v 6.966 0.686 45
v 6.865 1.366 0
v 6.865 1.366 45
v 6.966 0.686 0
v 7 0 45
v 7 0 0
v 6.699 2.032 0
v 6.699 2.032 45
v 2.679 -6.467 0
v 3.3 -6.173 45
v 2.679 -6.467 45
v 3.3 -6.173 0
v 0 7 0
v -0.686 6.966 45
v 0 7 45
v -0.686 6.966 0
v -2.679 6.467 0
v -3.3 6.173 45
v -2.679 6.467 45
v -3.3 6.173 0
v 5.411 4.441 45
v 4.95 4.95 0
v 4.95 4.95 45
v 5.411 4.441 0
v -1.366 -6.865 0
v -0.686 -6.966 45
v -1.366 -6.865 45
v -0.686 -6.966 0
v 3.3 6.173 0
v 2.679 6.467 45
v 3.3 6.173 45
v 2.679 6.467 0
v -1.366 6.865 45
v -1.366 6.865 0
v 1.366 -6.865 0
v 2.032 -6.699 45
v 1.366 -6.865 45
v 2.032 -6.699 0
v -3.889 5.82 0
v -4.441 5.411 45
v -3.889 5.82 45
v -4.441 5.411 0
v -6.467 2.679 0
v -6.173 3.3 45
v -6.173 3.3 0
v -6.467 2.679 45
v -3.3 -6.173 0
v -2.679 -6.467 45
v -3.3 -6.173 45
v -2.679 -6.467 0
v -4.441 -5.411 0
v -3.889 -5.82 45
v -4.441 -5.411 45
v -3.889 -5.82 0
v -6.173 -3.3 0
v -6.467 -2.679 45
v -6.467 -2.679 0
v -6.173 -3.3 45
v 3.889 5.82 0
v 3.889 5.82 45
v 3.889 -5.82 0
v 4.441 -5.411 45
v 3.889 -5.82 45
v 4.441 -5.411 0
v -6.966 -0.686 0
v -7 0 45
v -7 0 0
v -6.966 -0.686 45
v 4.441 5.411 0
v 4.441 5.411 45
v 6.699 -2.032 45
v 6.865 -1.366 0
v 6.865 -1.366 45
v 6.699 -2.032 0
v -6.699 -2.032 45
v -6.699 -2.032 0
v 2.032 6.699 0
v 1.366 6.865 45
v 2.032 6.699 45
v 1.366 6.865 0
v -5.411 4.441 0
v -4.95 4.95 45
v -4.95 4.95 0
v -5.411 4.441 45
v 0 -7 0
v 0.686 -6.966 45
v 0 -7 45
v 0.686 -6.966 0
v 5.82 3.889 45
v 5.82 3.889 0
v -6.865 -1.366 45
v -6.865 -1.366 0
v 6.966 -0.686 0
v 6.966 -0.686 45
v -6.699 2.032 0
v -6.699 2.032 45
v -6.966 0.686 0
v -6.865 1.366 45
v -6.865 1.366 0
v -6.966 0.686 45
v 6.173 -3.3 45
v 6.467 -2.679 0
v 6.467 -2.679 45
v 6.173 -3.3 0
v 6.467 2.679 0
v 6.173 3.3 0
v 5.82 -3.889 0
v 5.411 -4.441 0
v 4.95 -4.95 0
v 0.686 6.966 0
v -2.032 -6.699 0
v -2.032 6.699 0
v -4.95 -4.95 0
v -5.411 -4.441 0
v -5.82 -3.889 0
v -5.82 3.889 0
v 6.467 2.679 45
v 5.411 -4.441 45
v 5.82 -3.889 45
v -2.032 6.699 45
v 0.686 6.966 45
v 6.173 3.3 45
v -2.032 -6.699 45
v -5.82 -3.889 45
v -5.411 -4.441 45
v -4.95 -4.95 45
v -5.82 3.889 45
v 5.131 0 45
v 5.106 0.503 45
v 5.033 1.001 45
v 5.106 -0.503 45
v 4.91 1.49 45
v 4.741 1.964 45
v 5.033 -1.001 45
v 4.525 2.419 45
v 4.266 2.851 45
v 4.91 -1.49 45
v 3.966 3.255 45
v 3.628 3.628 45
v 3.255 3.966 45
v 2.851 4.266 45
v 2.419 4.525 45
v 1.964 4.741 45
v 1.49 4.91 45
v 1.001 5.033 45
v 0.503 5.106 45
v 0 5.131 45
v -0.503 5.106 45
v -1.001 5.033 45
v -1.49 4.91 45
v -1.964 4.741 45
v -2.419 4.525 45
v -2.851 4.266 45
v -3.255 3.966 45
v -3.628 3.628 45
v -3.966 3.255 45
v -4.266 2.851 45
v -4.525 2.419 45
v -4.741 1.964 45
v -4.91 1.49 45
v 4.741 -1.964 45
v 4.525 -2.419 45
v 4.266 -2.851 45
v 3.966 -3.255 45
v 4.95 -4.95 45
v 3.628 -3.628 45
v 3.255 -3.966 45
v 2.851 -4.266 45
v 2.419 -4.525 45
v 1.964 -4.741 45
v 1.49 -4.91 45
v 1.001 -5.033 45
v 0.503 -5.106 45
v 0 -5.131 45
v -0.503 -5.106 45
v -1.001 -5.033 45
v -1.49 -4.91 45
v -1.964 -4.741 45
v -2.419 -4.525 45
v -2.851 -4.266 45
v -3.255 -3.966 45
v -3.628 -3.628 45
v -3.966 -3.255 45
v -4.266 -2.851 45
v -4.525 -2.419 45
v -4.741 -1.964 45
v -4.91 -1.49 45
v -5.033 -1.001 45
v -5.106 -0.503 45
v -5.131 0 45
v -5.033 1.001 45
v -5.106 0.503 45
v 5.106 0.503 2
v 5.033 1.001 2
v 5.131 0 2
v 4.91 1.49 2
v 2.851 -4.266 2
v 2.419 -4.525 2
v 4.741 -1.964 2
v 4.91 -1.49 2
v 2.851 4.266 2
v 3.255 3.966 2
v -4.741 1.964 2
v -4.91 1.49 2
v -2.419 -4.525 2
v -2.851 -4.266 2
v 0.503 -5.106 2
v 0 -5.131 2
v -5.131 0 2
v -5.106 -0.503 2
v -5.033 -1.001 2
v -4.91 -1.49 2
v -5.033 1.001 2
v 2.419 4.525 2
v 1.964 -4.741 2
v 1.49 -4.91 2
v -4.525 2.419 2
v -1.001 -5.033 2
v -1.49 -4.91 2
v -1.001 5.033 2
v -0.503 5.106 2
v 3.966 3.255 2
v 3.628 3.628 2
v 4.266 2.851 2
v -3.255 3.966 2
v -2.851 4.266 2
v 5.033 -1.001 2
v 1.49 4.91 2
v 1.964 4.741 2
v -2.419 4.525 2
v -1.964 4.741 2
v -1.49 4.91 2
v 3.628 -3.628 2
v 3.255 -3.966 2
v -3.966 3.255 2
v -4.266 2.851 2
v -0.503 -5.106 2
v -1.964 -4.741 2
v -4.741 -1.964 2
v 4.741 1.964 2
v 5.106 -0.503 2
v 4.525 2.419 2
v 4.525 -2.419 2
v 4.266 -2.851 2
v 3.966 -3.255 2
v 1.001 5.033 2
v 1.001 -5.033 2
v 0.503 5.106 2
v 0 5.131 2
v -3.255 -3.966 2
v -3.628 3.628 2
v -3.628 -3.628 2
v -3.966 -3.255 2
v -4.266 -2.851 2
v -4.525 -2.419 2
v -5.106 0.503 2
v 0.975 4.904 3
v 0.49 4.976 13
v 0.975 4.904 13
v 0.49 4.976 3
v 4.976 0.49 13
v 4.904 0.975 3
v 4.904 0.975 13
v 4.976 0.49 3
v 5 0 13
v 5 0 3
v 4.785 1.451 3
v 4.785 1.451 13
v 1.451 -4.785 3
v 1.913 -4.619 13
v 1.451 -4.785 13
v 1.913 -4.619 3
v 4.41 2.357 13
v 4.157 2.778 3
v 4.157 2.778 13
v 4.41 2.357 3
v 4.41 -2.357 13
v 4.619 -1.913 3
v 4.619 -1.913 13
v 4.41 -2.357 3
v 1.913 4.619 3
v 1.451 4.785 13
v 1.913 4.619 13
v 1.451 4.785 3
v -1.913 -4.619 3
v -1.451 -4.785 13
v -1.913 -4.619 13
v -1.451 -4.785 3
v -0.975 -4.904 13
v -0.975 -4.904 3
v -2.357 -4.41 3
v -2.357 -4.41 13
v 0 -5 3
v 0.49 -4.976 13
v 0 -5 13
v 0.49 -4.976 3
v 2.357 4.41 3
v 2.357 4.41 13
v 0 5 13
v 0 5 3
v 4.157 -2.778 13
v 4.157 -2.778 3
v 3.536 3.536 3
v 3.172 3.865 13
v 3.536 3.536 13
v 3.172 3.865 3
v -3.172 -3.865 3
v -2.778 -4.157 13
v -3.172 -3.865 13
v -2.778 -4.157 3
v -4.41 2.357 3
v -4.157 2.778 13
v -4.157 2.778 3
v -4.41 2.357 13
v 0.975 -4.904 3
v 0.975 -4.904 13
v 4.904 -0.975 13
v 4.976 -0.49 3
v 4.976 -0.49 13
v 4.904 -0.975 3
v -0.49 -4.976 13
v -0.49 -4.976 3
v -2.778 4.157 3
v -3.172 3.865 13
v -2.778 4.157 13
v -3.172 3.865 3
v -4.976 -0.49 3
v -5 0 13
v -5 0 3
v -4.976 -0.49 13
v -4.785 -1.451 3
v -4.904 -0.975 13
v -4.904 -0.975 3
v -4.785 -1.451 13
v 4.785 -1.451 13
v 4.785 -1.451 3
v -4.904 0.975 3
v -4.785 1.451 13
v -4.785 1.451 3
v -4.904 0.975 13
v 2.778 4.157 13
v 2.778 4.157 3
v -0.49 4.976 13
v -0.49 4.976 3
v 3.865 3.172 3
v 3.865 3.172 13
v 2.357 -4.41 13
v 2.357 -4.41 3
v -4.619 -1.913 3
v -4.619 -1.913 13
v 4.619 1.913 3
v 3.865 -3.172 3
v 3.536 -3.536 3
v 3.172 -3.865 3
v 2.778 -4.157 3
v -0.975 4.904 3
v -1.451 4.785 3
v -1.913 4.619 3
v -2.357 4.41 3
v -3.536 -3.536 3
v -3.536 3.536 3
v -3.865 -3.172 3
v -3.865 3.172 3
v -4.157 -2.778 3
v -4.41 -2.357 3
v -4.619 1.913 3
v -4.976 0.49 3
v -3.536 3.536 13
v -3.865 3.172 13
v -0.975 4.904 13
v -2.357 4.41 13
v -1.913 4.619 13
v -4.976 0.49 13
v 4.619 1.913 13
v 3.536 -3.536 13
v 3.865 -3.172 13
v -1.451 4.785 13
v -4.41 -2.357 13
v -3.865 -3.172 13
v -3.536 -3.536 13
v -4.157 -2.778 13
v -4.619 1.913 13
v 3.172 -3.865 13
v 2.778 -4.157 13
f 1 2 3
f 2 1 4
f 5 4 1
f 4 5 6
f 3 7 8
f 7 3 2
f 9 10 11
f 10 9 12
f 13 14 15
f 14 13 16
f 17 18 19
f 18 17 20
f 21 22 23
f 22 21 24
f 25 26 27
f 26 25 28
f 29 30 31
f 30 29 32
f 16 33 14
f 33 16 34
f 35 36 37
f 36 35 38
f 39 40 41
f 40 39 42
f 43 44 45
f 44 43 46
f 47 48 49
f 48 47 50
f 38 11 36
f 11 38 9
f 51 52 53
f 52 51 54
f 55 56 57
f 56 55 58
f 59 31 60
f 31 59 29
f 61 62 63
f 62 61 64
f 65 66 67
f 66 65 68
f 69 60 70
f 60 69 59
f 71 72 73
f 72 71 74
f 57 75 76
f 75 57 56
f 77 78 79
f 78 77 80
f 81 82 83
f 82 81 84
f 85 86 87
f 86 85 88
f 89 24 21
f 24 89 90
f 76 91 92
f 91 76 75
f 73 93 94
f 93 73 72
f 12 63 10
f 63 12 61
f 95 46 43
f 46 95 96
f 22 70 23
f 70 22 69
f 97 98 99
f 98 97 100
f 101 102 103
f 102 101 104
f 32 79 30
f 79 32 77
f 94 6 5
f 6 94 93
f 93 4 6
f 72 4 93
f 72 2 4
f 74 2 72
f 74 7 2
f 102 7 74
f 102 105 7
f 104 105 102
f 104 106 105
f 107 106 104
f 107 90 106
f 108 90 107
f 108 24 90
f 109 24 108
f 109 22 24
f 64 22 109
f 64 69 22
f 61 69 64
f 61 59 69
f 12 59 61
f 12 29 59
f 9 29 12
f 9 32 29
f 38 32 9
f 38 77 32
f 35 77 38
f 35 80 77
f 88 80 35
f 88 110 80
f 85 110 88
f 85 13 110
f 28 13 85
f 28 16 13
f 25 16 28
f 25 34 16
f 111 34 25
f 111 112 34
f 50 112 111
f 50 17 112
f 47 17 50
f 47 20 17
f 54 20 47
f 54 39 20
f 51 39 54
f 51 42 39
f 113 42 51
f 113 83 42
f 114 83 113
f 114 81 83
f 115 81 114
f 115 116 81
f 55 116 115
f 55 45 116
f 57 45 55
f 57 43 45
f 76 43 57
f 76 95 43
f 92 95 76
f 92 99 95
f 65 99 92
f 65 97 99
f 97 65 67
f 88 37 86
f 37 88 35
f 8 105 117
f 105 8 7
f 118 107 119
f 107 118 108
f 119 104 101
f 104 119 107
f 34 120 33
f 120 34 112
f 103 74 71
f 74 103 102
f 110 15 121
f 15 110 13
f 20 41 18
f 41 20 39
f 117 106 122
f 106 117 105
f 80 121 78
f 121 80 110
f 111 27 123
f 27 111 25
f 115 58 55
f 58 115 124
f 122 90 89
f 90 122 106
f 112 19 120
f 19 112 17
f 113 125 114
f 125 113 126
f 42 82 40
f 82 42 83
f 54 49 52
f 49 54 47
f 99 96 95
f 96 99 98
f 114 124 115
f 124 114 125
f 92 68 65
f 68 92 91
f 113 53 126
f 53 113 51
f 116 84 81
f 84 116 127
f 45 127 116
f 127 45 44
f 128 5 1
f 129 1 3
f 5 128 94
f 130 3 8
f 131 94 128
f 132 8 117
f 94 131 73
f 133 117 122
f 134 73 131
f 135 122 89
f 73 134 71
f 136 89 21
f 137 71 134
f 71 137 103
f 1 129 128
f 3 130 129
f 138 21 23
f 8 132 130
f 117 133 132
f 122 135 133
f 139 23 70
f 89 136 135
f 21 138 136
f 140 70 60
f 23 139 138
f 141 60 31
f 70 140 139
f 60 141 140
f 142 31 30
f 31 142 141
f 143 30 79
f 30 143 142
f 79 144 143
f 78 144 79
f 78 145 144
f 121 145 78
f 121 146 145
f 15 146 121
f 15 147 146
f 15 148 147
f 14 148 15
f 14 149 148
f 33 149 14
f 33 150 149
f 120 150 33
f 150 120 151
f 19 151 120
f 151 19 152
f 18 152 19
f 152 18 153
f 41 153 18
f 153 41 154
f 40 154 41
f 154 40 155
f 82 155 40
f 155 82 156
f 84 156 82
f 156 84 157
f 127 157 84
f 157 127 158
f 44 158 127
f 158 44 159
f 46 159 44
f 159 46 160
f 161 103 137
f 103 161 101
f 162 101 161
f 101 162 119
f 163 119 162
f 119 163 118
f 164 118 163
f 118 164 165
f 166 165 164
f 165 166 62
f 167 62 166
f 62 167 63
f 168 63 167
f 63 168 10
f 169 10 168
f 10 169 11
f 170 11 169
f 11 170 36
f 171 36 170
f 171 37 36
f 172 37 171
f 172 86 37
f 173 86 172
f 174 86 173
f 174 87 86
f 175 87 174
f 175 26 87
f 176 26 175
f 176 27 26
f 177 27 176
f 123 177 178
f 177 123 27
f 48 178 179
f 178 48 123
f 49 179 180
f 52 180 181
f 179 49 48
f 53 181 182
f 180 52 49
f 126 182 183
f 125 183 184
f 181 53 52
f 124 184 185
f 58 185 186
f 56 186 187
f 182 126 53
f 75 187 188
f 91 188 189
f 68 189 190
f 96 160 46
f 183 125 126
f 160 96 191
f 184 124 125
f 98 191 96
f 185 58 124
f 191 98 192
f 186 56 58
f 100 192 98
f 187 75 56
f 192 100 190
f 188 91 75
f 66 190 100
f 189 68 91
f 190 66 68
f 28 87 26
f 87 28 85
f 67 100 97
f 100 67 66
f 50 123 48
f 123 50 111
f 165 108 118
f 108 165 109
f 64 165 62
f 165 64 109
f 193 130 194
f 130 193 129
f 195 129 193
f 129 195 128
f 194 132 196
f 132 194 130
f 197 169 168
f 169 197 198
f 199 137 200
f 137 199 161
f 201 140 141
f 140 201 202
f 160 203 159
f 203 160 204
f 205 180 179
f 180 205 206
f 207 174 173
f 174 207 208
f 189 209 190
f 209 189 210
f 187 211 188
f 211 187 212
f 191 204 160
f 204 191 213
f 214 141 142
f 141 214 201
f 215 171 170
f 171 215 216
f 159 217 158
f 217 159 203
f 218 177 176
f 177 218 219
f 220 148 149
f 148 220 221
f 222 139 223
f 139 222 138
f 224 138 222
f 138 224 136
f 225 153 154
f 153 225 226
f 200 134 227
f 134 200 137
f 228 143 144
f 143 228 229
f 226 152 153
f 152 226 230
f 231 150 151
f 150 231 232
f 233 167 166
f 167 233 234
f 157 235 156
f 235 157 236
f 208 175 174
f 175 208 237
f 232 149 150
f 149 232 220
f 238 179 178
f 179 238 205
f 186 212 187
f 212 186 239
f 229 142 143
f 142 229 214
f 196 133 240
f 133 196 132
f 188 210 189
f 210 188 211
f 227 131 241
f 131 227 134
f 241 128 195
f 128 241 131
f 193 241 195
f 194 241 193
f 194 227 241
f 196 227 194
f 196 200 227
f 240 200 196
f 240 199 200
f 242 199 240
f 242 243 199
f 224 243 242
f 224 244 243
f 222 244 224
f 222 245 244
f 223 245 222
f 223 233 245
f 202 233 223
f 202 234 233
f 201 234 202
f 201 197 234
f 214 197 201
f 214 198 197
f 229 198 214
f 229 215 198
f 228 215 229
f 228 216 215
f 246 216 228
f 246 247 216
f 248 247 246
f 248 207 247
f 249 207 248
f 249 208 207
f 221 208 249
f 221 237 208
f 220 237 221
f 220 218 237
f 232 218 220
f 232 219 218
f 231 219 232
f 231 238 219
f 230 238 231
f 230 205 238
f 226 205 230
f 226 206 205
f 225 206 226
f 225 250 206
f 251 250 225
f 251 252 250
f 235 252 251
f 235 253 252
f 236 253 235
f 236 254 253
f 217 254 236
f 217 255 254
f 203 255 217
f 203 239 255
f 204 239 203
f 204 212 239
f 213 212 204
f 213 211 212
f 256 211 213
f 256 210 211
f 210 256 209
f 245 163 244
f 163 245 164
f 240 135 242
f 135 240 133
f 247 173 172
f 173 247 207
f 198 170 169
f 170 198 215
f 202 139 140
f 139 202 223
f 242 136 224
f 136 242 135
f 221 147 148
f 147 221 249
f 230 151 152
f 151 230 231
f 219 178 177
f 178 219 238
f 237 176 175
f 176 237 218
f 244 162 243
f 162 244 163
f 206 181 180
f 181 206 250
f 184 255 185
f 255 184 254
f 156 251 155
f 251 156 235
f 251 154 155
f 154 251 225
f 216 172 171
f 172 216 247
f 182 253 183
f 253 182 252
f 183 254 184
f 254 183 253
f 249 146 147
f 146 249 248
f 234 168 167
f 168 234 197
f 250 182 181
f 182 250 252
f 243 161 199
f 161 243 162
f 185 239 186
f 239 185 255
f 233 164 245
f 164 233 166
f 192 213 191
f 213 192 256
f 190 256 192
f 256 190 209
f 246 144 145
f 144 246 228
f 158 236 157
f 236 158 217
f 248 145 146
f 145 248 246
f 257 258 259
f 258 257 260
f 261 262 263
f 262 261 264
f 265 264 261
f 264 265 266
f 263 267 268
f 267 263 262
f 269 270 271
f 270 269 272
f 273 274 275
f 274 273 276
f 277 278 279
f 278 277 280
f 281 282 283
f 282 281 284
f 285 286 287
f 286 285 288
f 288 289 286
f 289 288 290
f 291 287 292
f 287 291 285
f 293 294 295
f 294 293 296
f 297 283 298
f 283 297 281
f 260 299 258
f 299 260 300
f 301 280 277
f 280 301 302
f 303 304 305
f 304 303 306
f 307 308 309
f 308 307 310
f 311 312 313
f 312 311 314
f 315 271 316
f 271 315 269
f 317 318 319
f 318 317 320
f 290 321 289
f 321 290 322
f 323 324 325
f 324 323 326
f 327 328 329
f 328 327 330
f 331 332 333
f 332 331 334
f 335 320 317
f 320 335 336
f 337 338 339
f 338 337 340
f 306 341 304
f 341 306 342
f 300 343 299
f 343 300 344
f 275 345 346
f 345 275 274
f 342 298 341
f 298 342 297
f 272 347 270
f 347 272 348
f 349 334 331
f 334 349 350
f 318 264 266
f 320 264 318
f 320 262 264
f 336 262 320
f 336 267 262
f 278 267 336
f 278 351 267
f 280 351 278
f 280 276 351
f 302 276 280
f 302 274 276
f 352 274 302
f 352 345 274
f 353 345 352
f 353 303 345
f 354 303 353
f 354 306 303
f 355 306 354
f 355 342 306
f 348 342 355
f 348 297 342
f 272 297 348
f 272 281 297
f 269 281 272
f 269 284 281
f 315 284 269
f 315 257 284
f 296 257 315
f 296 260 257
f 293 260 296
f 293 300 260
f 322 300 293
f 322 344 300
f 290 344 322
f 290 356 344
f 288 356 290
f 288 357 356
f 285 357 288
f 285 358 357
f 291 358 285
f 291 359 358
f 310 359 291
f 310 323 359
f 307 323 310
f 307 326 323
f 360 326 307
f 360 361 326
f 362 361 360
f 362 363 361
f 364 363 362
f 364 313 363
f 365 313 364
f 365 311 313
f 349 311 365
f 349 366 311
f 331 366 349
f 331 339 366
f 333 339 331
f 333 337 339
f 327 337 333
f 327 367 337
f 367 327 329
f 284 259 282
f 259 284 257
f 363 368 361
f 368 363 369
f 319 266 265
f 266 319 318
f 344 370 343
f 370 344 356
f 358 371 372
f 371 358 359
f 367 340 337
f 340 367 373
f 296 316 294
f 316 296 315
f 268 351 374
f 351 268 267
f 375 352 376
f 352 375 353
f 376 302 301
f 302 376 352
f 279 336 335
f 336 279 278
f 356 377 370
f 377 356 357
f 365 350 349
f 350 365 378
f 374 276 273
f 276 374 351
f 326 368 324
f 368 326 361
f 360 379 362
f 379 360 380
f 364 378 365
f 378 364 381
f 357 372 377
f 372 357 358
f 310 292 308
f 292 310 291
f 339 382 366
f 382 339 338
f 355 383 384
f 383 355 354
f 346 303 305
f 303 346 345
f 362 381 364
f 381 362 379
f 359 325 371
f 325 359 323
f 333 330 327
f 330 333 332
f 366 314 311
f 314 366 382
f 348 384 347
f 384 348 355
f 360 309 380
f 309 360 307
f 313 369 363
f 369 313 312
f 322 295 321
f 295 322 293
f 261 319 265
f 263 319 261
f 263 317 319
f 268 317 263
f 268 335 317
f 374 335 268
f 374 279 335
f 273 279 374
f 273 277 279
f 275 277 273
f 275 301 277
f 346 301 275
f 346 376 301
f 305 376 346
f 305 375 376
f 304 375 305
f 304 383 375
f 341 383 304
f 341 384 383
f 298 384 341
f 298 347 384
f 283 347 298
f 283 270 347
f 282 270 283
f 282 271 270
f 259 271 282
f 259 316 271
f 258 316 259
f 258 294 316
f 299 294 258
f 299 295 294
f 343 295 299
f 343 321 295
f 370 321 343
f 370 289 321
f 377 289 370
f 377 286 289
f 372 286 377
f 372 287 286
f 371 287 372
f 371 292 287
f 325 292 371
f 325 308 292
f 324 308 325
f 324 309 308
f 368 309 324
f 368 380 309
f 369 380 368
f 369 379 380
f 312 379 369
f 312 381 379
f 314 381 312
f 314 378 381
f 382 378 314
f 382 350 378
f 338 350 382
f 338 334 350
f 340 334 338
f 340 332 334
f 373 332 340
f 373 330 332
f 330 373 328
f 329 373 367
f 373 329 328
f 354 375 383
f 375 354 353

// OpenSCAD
// Reference submission for piston-bore-45.
// Same cup-and-piston topology with a 45 mm barrel and a 10.25 mm bore
// inscribed diameter, giving 0.25 mm as-designed diametral clearance.
// Units: mm. Axis: +Z through the origin.
agentscad_part = "all";
piston_stroke = 0;   // pose control: the benchmark re-renders the piston at this stroke
$fn = 64;

bore_d = 10.25 / cos(180 / $fn);

module barrel() {
  difference() {
    translate([0, 0, 0]) cylinder(h = 45, d = 14);
    translate([0, 0, 2]) cylinder(h = 44, d = bore_d);
  }
}

module piston() {
  translate([0, 0, 3 + piston_stroke]) cylinder(h = 10, d = 10);
}

module generated_part() {
  if (agentscad_part == "all" || agentscad_part == "barrel") barrel();
  if (agentscad_part == "all" || agentscad_part == "piston") piston();
}

generated_part();
